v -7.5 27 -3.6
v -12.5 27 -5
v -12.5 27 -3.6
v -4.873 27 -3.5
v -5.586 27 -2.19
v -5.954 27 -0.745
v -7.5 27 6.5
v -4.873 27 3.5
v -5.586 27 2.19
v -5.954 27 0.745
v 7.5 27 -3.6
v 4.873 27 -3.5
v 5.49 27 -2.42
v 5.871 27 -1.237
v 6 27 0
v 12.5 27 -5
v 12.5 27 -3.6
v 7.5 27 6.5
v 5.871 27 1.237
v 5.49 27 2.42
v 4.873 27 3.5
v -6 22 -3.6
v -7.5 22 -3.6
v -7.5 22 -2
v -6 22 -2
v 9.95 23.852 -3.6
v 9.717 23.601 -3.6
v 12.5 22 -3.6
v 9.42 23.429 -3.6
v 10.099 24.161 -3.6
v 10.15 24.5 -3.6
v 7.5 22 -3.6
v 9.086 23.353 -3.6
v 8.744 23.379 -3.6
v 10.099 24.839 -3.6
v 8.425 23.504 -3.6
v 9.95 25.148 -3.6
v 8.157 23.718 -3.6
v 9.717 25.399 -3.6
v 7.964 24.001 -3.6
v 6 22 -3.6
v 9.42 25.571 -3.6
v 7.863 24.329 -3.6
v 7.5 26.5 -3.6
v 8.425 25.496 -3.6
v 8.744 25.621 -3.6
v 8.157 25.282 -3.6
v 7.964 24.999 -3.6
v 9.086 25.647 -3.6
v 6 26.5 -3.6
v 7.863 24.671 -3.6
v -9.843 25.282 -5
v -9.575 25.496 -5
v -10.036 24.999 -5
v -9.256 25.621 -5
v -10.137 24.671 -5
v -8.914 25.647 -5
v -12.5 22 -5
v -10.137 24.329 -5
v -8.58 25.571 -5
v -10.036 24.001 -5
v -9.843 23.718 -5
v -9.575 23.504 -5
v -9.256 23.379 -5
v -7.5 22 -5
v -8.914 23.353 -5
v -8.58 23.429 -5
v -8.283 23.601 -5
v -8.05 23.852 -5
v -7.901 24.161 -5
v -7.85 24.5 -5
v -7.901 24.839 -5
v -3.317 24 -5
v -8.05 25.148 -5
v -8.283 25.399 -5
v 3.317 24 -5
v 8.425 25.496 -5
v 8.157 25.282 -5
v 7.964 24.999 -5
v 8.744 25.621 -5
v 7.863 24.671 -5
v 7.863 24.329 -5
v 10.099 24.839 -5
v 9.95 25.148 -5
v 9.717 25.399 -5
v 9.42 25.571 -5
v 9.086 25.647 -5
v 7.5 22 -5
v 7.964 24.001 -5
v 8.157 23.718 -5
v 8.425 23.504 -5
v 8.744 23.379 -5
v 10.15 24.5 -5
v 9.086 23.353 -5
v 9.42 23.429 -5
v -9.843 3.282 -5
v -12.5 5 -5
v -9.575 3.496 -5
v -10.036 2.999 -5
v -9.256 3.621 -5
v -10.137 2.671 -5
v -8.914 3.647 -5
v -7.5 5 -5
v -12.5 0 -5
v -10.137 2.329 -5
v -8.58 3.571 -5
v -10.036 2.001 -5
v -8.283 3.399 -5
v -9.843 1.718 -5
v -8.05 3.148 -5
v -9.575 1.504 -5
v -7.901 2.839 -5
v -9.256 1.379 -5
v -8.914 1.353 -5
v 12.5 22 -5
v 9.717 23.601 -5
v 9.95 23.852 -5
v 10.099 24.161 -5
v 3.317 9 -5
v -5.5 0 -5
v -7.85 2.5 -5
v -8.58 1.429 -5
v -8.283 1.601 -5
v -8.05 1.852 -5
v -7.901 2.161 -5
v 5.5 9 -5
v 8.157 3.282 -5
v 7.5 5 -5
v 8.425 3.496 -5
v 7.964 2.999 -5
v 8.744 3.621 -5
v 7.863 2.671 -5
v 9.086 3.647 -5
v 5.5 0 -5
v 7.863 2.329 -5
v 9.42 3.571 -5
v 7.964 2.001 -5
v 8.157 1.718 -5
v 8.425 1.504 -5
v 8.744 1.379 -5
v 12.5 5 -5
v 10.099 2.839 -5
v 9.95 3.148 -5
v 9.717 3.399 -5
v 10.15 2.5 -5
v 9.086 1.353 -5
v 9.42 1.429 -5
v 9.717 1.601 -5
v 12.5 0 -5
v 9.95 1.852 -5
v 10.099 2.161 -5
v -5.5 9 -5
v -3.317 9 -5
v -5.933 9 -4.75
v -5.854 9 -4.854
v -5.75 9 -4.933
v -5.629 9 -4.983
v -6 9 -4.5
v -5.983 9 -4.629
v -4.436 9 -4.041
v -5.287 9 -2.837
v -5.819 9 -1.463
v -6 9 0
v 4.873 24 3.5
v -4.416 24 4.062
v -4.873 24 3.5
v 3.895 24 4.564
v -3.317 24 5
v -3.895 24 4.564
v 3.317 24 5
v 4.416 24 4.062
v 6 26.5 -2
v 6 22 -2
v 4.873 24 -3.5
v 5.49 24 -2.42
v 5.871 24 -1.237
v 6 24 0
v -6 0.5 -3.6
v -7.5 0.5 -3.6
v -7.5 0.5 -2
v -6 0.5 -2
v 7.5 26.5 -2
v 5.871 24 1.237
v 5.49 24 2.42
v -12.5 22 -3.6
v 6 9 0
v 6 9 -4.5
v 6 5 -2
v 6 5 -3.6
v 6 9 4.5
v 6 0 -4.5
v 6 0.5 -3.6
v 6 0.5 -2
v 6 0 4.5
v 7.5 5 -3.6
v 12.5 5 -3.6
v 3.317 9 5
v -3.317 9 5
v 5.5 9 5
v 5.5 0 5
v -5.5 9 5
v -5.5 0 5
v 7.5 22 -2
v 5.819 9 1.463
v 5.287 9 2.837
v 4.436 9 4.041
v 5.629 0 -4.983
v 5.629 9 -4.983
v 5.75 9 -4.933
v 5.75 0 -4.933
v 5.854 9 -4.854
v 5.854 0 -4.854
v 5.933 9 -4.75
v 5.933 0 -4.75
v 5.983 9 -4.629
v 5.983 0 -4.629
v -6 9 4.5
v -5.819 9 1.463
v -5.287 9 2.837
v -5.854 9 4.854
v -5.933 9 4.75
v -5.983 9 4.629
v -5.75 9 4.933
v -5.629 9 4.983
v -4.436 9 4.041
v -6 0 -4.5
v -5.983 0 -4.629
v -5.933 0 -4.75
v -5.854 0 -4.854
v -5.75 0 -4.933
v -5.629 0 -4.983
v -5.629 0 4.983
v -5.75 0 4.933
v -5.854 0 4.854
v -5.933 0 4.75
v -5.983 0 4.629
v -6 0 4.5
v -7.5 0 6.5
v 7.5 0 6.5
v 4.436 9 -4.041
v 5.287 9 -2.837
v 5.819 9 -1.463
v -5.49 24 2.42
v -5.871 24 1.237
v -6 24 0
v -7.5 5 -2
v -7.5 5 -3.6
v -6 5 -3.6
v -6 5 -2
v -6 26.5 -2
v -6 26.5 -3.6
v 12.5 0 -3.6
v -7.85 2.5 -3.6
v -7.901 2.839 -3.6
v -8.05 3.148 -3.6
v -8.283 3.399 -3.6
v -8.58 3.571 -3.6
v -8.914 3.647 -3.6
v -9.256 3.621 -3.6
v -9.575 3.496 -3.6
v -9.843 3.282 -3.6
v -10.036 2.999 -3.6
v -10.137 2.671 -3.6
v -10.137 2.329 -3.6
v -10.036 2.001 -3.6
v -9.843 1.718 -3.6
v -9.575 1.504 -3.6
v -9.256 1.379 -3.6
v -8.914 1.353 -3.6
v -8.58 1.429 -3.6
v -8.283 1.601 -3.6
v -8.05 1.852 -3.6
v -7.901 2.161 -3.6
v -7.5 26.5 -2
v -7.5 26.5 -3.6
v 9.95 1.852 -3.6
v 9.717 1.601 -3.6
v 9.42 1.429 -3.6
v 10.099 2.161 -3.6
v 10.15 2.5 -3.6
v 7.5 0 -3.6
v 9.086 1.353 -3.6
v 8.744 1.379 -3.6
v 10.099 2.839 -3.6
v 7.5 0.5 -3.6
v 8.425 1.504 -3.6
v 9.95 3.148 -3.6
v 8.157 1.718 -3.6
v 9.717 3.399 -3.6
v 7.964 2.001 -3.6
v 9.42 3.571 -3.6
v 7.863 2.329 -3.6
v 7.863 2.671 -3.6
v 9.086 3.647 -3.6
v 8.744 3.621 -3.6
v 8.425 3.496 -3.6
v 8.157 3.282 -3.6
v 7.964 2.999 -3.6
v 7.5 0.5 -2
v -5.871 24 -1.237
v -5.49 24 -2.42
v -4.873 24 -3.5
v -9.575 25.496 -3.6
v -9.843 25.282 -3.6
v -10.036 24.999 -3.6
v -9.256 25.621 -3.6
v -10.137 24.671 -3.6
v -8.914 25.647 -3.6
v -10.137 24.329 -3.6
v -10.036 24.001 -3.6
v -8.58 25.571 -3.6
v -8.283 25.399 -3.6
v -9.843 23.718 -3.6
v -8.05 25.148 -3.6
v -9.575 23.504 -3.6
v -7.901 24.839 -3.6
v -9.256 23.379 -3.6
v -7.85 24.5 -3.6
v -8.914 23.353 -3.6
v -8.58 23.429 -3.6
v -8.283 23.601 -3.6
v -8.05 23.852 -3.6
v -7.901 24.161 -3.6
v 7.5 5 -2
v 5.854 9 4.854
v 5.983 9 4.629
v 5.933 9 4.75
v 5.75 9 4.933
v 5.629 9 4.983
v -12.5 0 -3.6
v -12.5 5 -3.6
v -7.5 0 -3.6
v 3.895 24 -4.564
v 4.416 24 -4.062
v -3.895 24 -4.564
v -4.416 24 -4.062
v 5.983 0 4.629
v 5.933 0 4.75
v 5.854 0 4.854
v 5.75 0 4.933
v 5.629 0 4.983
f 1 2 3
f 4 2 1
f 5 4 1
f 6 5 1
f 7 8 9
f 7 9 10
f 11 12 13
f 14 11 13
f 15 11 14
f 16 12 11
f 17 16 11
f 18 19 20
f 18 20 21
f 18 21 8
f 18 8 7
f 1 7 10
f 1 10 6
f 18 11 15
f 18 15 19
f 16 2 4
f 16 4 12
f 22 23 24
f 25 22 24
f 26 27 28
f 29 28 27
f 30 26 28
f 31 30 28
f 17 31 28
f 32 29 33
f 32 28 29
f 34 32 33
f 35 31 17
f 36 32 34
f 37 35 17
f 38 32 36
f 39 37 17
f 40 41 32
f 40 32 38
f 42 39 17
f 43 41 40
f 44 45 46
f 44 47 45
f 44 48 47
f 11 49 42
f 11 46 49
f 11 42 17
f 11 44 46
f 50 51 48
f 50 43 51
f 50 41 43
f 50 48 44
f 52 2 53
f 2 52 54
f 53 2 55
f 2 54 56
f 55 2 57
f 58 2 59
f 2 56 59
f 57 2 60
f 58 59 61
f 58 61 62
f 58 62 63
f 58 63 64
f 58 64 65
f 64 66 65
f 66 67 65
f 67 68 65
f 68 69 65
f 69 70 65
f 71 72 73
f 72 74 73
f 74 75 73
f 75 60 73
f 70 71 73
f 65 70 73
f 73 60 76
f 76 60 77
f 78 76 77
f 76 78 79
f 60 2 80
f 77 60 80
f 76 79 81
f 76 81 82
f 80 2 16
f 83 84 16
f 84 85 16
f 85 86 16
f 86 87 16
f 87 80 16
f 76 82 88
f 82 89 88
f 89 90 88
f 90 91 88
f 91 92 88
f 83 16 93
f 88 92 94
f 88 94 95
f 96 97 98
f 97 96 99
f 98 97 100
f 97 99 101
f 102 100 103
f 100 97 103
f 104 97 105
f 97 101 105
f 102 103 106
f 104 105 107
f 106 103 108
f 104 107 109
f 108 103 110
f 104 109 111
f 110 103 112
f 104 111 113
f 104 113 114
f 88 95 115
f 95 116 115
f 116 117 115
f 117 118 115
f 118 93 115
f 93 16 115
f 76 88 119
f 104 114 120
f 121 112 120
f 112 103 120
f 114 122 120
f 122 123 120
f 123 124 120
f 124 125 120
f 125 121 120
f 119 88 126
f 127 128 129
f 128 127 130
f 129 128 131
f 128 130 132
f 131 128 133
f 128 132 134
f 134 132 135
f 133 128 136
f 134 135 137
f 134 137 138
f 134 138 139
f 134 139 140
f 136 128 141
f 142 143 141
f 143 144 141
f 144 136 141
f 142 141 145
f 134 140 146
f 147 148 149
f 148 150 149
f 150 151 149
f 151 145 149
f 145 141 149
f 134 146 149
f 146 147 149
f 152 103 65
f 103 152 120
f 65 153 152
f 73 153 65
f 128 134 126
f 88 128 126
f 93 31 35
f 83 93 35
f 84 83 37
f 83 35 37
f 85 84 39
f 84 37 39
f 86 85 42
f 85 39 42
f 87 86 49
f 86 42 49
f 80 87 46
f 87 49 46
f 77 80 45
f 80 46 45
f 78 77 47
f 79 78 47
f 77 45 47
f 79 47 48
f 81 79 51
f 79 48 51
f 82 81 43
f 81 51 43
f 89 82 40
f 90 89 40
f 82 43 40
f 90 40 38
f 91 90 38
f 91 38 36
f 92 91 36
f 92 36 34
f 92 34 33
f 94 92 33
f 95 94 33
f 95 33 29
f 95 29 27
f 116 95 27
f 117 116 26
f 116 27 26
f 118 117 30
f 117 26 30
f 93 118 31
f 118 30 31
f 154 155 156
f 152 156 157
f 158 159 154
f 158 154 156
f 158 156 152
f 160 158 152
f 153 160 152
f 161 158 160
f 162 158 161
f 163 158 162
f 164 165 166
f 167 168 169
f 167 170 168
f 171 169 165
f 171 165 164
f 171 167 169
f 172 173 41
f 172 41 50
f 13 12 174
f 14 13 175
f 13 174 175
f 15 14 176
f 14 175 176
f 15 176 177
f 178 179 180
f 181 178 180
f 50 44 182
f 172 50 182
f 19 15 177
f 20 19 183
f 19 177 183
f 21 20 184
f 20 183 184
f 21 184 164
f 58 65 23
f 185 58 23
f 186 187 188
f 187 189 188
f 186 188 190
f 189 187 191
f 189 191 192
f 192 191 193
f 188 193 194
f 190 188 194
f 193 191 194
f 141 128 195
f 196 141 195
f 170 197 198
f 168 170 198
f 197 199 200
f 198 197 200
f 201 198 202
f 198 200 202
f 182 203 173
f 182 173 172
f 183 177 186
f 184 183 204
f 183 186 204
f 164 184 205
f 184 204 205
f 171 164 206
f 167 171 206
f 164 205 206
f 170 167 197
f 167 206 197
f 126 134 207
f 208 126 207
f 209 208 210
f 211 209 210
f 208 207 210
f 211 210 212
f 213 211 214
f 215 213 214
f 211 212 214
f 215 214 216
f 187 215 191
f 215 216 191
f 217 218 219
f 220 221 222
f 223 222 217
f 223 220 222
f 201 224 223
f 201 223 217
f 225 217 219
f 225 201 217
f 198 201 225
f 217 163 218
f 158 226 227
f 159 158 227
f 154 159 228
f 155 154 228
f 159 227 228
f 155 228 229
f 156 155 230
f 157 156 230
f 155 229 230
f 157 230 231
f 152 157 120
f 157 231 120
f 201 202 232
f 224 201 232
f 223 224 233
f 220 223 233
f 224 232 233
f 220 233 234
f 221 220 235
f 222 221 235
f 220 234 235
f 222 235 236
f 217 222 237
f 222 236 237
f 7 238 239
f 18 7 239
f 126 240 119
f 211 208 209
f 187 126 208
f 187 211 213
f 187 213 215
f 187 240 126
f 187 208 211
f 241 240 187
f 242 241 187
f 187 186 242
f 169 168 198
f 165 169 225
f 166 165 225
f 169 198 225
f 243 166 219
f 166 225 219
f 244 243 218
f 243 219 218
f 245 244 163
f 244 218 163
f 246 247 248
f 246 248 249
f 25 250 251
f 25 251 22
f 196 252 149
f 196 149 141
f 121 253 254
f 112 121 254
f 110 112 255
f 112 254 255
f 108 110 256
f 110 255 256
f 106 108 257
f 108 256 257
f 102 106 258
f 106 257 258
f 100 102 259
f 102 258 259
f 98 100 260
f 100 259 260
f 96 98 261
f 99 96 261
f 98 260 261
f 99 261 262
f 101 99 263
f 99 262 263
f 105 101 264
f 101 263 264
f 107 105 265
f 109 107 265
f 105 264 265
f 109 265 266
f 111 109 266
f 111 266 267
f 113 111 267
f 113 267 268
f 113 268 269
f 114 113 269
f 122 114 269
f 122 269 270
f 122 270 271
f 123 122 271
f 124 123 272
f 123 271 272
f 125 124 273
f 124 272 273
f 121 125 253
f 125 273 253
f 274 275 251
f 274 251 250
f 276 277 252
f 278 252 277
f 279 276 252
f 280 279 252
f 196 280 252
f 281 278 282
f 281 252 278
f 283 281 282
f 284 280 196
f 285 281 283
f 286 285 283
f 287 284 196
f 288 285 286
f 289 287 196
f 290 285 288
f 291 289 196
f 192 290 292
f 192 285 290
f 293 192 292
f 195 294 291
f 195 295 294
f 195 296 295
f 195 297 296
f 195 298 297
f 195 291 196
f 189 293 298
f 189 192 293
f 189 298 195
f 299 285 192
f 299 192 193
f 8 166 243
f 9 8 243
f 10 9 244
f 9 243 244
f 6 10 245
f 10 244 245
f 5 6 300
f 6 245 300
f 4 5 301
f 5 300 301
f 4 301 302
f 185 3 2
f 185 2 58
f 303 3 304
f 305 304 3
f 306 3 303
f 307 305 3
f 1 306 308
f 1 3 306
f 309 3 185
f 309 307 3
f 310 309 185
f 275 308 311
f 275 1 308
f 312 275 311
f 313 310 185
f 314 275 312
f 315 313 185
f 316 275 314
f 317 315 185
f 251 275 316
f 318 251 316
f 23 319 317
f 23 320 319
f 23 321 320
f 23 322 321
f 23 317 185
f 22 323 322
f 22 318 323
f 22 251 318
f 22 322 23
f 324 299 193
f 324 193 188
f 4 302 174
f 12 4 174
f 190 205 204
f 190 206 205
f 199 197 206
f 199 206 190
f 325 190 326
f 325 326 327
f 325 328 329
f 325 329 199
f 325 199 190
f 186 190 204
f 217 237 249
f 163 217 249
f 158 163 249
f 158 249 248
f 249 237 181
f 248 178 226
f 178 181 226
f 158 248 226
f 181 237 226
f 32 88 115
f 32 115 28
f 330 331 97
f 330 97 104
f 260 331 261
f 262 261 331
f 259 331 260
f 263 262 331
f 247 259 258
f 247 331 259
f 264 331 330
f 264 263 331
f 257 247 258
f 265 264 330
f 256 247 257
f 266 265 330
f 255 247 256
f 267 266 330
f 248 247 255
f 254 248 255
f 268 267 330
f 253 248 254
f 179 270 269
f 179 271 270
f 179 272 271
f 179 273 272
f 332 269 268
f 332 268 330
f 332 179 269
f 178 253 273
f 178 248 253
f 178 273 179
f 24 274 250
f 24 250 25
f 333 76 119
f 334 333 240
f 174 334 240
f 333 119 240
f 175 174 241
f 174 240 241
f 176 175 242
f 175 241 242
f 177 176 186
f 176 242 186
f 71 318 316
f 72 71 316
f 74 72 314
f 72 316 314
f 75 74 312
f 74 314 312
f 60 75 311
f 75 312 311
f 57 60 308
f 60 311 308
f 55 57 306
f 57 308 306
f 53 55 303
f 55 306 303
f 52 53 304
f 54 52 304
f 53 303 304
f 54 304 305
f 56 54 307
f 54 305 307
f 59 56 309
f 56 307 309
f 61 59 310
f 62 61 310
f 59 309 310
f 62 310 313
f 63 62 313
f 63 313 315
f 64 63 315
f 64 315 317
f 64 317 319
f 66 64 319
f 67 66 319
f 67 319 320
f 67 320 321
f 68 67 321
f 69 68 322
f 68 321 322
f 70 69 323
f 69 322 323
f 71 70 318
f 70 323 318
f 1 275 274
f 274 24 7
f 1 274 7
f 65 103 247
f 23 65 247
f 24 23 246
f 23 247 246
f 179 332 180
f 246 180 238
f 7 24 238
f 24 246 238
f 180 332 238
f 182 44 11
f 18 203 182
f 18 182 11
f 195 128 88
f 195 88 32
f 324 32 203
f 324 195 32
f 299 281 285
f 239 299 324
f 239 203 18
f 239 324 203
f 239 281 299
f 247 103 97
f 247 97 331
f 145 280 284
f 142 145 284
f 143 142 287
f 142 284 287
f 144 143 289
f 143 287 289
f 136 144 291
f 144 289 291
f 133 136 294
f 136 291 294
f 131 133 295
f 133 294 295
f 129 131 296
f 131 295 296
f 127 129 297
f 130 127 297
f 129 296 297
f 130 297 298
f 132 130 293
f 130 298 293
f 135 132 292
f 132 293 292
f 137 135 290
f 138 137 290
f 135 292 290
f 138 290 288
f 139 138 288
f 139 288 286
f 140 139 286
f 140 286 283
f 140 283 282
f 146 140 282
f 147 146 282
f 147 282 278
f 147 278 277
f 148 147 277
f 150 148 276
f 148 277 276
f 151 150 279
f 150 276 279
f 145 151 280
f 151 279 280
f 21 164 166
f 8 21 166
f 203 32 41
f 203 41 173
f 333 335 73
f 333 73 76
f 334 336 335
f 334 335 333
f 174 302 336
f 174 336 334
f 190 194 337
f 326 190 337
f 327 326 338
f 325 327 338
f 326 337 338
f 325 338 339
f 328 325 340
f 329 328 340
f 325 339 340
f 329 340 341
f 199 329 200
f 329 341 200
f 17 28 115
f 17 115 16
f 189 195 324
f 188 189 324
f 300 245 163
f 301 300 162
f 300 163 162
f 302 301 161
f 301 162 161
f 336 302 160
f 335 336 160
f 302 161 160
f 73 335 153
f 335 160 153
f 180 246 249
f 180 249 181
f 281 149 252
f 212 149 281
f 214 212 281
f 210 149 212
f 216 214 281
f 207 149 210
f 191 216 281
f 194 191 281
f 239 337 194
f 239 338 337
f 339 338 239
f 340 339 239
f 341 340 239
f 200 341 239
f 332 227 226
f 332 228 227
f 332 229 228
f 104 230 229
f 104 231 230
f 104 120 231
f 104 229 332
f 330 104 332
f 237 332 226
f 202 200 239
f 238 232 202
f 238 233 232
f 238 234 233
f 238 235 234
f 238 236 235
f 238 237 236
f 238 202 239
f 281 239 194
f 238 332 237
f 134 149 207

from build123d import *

# Parameters (mm, degrees)
F0_W      = 15
F0_H      = 11.5
F1_DEPTH  = 27
F3_DEPTH  = 9
F5_DEPTH  = 15
F7_DEPTH  = 3
F8_W      = 5
F8_H      = 1.4
F9_DEPTH  = 5
F10_R     = 1.15
F11_DEPTH = 1.4
F12_W     = 4.5
F12_H     = 1.6
F13_DEPTH = 1.5
F14_W     = 5
F14_H     = 1.4
F15_DEPTH = 5
F16_R     = 1.15
F17_DEPTH = 1.4
F18_W     = 4.5
F18_H     = 1.6
F19_DEPTH = 1.5


# Not quite as in the source:
# - a feature names something its author has since deleted; it is built from what else it names


with BuildPart() as f1:
    # F0 (on Front) → F1 (new body)
    with BuildSketch(Plane.XZ):
        with Locations((0, 0.75)):
            Rectangle(F0_W, F0_H)
    extrude(amount=-F1_DEPTH)

    # F2 (on Front) → F3 (cut)
    with BuildSketch(Plane.XZ):
        with BuildLine():
            Line((5.5, 5), (-5.5, 5))
            ThreePointArc((-5.5, 5), (-5.8535533906, 4.8535533906), (-6, 4.5))
            Line((-6, 4.5), (-6, -4.5))
            ThreePointArc((-6, -4.5), (-5.8535533906, -4.8535533906), (-5.5, -5))
            Line((-5.5, -5), (5.5, -5))
            ThreePointArc((5.5, -5), (5.8535533906, -4.8535533906), (6, -4.5))
            Line((6, -4.5), (6, 4.5))
            ThreePointArc((6, 4.5), (5.8535533906, 4.8535533906), (5.5, 5))
        make_face()
    extrude(amount=-F3_DEPTH, mode=Mode.SUBTRACT)

    # F4 (on face) → F5 (cut)
    with BuildSketch(Plane.XZ.offset(-9)):
        with BuildLine():
            Line((-3.3166247904, -5), (3.3166247904, -5))
            ThreePointArc((3.3166247904, -5), (5.2867640737, -2.8372743309), (6, 0))
            ThreePointArc((6, 0), (5.2867640737, 2.8372743309), (3.3166247904, 5))
            Line((3.3166247904, 5), (0, 5))
            Line((0, 5), (-3.3166247904, 5))
            ThreePointArc((-3.3166247904, 5), (-5.2867640737, 2.8372743309), (-6, 0))
            ThreePointArc((-6, 0), (-5.2867640737, -2.8372743309), (-3.3166247904, -5))
        make_face()
    extrude(amount=-F5_DEPTH, mode=Mode.SUBTRACT)

    # F6 (on face) → F7 (cut)
    with BuildSketch(Plane.XZ.offset(-24)):
        with BuildLine():
            ThreePointArc((4.8733971724, -3.5), (5.7114088907, -1.8384255445), (6, 0))
            ThreePointArc((6, 0), (5.7114088907, 1.8384255445), (4.8733971724, 3.5))
            Line((4.8733971724, 3.5), (0, 3.5))
            Line((0, 3.5), (-4.8733971724, 3.5))
            ThreePointArc((-4.8733971724, 3.5), (-6, 0), (-4.8733971724, -3.5))
            Line((-4.8733971724, -3.5), (4.8733971724, -3.5))
        make_face()
    extrude(amount=-F7_DEPTH, mode=Mode.SUBTRACT)

    # F8 (on face) → F9 (join)
    with BuildSketch(Plane.YZ.offset(7.5)):
        with Locations((2.5, -4.3)):
            Rectangle(F8_W, F8_H)
        with Locations((24.5, -4.3)):
            Rectangle(F8_W, F8_H)
    extrude(amount=F9_DEPTH)

    # F10 (on face) → F11 (cut)
    with BuildSketch(Plane.XY.offset(-3.6)):
        with Locations((9, 24.5)):
            Circle(F10_R)
        with Locations((9, 2.5)):
            Circle(F10_R)
    extrude(amount=-F11_DEPTH, mode=Mode.SUBTRACT)

    # F12 (on face) → F13 (cut)
    with BuildSketch(Plane.YZ.offset(7.5)):
        with Locations((2.75, -2.8)):
            Rectangle(F12_W, F12_H)
        with Locations((24.25, -2.8)):
            Rectangle(F12_W, F12_H)
    extrude(amount=-F13_DEPTH, mode=Mode.SUBTRACT)

    # F14 (on face) → F15 (join)
    with BuildSketch(Plane(origin=(-7.5, 0, 0), x_dir=(0, -1, 0), z_dir=(-1, 0, 0))):
        with Locations((-24.5, -4.3)):
            Rectangle(F14_W, F14_H)
        with Locations((-2.5, -4.3)):
            Rectangle(F14_W, F14_H)
    extrude(amount=F15_DEPTH)

    # F16 (on face) → F17 (cut)
    with BuildSketch(Plane.XY.offset(-3.6)):
        with Locations((-9, 2.5)):
            Circle(F16_R)
        with Locations((-9, 24.5)):
            Circle(F16_R)
    extrude(amount=-F17_DEPTH, mode=Mode.SUBTRACT)

    # F18 (on face) → F19 (cut)
    with BuildSketch(Plane(origin=(-7.5, 0, 0), x_dir=(0, -1, 0), z_dir=(-1, 0, 0))):
        with Locations((-24.25, -2.8)):
            Rectangle(F18_W, F18_H)
        with Locations((-2.75, -2.8)):
            Rectangle(F18_W, F18_H)
    extrude(amount=-F19_DEPTH, mode=Mode.SUBTRACT)


solid = f1.part
